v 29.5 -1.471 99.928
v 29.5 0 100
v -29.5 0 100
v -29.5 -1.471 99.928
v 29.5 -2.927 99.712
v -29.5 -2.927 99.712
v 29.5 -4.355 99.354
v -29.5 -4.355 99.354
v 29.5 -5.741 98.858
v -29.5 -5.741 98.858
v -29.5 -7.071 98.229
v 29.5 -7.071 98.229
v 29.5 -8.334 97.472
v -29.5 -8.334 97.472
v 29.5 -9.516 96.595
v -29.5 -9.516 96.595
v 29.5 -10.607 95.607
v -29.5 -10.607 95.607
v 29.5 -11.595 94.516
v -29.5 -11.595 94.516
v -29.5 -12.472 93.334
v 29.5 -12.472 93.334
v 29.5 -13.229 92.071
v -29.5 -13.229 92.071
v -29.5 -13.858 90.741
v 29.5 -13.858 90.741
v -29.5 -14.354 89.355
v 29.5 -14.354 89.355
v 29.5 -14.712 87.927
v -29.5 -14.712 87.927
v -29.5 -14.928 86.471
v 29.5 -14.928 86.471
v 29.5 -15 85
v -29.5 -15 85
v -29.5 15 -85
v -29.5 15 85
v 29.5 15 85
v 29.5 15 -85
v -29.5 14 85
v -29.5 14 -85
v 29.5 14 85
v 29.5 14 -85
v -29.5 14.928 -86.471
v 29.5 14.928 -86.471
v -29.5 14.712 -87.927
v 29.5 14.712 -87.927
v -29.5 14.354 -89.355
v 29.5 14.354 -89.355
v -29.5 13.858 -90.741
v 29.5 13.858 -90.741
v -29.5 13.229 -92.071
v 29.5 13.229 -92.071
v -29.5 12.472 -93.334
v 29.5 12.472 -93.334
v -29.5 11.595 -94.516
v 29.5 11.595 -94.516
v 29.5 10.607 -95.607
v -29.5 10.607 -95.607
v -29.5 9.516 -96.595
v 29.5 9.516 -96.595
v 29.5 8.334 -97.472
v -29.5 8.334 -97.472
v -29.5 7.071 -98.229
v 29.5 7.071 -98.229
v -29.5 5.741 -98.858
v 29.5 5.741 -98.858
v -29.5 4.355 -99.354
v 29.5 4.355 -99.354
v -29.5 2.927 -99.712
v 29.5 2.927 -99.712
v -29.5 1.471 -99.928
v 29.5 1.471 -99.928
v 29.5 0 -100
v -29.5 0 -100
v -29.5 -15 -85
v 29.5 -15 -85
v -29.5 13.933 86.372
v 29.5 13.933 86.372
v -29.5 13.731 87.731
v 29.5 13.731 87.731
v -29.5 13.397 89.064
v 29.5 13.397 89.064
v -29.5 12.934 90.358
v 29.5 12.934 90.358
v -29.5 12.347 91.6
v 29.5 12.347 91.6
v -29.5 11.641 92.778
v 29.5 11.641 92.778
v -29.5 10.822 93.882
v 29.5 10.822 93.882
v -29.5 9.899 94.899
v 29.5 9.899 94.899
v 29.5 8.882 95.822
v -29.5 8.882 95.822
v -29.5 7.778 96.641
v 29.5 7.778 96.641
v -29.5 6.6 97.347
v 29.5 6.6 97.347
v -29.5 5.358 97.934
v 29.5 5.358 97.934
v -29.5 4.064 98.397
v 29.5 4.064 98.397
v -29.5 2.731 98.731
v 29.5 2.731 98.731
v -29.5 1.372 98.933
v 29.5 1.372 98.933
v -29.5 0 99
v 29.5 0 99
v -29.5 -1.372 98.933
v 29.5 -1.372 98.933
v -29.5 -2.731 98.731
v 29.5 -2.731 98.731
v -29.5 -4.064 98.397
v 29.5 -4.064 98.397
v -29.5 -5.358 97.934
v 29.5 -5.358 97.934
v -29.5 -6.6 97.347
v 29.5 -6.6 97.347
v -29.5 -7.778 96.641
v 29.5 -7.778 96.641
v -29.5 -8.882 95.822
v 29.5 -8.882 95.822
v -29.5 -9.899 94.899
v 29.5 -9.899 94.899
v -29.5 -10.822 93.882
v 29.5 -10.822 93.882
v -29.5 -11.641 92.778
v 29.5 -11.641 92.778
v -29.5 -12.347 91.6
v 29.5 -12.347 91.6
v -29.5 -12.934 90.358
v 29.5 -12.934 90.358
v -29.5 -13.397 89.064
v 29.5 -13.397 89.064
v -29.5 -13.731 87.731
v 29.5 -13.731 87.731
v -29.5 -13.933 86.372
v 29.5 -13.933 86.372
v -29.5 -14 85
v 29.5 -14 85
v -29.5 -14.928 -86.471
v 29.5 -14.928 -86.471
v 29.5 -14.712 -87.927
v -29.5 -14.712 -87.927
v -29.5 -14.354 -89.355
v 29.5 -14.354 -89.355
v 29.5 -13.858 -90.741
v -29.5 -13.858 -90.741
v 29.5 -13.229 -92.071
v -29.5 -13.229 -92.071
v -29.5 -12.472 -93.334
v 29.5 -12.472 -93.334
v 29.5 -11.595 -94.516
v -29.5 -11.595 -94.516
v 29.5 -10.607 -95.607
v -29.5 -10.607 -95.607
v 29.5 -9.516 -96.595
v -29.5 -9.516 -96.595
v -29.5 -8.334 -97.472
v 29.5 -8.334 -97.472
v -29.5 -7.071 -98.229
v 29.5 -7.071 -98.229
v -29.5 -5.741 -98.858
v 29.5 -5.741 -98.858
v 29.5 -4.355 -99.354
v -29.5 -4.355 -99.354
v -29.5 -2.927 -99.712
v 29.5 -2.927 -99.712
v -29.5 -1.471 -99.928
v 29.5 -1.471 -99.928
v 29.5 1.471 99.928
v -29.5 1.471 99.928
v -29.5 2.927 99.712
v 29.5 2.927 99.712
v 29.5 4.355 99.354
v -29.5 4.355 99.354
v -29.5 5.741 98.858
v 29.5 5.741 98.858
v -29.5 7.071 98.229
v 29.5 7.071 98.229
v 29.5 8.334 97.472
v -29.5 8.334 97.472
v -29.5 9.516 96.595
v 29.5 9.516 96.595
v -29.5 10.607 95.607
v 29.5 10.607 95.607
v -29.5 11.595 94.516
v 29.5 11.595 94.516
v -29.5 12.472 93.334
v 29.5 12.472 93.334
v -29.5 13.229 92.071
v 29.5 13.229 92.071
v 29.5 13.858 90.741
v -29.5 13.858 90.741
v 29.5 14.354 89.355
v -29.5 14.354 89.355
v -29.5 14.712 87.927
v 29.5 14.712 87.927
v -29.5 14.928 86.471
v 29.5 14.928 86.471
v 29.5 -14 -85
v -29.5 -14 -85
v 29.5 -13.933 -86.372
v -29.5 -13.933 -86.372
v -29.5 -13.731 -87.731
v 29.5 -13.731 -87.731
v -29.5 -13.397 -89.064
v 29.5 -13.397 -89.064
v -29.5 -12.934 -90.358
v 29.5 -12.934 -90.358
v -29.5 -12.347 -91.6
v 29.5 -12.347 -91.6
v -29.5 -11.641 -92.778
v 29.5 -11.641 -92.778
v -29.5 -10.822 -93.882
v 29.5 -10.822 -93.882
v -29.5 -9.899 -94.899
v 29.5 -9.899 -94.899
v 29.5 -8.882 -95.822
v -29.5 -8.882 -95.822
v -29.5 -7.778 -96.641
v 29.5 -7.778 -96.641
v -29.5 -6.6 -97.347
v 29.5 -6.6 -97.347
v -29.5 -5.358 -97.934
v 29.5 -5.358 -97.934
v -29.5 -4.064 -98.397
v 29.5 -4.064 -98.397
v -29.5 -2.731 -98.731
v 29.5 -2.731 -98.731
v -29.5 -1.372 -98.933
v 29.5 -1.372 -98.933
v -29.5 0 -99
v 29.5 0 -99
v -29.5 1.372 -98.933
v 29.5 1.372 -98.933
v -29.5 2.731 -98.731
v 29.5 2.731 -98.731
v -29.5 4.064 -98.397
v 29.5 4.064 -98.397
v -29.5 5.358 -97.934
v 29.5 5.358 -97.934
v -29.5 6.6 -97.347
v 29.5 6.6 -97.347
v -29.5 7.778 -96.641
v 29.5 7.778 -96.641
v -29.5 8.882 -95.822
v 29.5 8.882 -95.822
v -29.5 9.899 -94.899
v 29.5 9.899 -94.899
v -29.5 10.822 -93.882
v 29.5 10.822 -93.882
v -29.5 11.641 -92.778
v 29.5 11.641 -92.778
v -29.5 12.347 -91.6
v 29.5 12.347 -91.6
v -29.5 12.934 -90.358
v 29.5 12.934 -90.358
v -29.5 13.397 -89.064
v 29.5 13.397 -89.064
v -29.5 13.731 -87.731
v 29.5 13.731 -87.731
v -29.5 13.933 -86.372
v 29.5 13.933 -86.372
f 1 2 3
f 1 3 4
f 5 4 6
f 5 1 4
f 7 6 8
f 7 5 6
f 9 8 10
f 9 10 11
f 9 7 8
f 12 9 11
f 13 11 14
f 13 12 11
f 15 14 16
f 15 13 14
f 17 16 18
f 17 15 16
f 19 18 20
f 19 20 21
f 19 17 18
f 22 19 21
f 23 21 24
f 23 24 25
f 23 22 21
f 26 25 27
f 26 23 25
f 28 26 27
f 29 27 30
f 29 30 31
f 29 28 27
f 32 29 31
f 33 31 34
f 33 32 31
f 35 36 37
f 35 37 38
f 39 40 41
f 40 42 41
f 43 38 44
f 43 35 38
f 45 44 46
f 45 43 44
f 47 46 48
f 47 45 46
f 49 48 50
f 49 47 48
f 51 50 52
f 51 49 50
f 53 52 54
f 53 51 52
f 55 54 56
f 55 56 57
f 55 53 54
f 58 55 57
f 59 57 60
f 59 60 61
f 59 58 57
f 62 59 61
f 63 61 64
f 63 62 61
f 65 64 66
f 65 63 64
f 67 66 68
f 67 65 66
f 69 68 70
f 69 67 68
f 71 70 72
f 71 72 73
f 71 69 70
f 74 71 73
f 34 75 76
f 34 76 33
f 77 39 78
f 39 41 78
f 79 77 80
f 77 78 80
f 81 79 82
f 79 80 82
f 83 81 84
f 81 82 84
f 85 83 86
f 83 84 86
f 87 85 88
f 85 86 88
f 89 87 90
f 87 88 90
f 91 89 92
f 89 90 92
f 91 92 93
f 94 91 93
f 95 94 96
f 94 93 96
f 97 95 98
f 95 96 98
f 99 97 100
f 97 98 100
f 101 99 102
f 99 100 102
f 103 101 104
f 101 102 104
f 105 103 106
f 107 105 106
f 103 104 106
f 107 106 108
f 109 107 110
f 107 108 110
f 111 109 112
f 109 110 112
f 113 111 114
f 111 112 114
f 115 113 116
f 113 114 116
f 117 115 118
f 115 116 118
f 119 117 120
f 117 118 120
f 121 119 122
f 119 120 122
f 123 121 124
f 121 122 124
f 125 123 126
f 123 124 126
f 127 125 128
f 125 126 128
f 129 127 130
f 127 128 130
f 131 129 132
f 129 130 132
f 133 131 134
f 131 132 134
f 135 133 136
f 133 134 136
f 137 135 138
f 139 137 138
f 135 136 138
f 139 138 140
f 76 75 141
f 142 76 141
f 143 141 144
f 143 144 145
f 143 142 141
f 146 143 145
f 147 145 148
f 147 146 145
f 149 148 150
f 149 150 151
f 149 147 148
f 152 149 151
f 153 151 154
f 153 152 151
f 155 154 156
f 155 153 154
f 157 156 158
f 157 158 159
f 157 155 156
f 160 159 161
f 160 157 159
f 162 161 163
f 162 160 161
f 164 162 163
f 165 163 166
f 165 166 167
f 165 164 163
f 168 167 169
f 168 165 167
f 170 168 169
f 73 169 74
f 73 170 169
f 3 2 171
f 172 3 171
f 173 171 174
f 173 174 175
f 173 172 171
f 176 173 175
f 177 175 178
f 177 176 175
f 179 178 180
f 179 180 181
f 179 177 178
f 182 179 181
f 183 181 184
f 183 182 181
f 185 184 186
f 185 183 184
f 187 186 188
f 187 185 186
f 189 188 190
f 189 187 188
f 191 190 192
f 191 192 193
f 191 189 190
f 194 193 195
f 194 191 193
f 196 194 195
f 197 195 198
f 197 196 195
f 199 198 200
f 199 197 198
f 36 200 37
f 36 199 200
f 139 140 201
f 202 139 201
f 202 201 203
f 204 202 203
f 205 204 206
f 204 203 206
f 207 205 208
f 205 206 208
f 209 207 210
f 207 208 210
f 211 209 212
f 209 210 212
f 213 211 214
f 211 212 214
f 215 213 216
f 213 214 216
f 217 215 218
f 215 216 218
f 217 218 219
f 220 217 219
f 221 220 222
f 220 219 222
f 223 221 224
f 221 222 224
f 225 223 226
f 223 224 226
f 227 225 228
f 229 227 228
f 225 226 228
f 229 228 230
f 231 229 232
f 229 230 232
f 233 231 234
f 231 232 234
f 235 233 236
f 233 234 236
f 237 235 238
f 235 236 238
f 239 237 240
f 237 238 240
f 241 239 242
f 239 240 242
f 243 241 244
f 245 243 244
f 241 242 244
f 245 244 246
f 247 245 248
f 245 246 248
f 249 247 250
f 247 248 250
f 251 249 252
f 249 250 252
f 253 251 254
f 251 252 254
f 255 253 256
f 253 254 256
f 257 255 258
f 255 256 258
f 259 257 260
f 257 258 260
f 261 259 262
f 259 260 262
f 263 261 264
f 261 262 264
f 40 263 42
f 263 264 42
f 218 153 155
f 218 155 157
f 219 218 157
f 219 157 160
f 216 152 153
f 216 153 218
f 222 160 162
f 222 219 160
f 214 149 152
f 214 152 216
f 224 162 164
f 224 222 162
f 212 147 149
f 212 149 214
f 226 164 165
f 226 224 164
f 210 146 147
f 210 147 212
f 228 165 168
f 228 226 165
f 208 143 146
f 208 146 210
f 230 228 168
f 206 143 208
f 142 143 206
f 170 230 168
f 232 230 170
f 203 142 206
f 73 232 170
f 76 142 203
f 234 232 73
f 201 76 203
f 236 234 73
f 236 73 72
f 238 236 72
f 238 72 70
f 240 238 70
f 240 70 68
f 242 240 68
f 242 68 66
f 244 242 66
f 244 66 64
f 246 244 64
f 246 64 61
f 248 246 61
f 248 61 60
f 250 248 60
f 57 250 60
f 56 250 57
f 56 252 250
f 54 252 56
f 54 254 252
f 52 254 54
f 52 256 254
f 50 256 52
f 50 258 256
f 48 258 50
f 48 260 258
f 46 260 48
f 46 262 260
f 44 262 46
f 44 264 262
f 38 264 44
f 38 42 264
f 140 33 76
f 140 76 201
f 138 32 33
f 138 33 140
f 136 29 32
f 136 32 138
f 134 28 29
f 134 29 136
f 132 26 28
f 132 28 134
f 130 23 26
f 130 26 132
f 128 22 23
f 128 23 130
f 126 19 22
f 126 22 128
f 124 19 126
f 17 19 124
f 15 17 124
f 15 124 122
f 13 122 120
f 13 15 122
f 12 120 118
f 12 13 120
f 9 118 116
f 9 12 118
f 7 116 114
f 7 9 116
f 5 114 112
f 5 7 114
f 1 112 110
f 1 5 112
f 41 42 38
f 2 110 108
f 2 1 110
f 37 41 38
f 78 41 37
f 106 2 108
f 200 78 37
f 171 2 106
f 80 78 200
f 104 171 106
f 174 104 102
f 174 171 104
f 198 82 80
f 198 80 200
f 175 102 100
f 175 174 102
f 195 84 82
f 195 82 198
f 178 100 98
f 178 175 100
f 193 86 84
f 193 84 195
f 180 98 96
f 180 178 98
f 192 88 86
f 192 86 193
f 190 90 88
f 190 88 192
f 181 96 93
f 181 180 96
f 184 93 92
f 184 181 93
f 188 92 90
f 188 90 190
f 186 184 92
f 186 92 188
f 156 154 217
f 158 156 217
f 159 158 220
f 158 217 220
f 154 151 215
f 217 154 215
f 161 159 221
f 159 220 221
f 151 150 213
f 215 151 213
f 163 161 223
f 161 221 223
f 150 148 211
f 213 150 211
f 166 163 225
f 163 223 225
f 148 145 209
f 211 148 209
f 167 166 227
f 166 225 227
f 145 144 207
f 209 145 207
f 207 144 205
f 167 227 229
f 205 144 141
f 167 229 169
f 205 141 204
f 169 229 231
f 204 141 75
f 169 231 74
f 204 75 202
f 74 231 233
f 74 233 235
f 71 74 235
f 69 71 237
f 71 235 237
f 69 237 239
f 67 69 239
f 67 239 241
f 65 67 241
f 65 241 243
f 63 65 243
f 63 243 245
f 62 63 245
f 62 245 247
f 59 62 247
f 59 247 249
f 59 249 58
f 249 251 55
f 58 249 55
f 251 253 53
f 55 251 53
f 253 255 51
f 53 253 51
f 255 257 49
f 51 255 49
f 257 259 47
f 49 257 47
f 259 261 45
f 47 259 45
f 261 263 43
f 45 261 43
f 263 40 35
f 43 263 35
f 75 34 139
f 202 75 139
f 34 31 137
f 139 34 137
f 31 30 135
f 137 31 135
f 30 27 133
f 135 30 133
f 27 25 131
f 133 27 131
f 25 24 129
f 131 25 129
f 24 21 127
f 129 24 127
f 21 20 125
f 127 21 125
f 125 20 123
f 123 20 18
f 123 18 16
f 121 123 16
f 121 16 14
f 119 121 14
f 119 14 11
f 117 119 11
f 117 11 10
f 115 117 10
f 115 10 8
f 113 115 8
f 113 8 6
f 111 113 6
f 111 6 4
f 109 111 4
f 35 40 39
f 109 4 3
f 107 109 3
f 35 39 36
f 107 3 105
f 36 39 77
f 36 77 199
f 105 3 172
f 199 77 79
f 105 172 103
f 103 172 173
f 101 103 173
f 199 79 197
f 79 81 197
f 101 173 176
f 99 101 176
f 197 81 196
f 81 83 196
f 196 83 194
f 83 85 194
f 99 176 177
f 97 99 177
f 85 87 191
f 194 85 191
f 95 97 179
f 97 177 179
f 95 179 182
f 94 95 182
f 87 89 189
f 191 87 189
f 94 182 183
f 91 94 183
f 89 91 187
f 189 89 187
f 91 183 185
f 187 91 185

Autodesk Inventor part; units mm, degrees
ref_plane "YZ Plane" through (0, 0, 0) normal (1, 0, 0) x (0, 1, 0)
ref_plane "XZ Plane" through (0, 0, 0) normal (0, 1, 0) x (-1, 0, 0)
ref_plane "XY Plane" through (0, 0, 0) normal (0, 0, 1) x (1, 0, 0)
sketch "Эскиз1" plane through (0, 0, 0) normal (1, 0, 0) x (0, 1, 0)
  line L0 (-15, 100) -> (15, 100)
  line L1 (15, 100) -> (15, -100)
  line L2 (15, -100) -> (-15, -100)
  line L3 (-15, -100) -> (-15, 100)
  line L4 (-21, 0) -> (21, 0) construction
  line L5 (0, -140) -> (0, 140) construction
  point P0 (0, 0)
  dimension "d0" = 200
  dimension "d1" = 30
extrude "Выдавливание2" add sketch "Эскиз1" along normal mid plane 59
fillet "Сопряжение1" radius 15 4 edges at (0, 15, 100) (0, -15, 100) (0, 15, -100) (0, -15, -100)
sketch "Эскиз2" plane through (29.5, 0, 0) normal (1, 0, 0) x (0, 0, -1)
  arc A0 (85, -15) -> (85, 15) centre (85, 0) ccw construction
  line L0 (85, 15) -> (-85, 15) construction
  arc A1 (-85, 15) -> (-85, -15) centre (-85, 0) ccw construction
  line L1 (-85, -15) -> (85, -15) construction
  line L2 (-99, -14) -> (99, -14)
  line L3 (99, -14) -> (99, 14)
  line L4 (99, 14) -> (-99, 14)
  line L5 (-99, 14) -> (-99, -14)
  arc A2 (-85, 14) -> (-99, 0) centre (-85, 0) ccw
  arc A3 (-85, 15) -> (-85, -15) centre (-85, 0) ccw projected
  arc A4 (-99, 0) -> (-85, -14) centre (-85, 0) ccw
  arc A5 (99, 0) -> (85, 14) centre (85, 0) ccw
  arc A6 (85, -15) -> (85, 15) centre (85, 0) ccw projected
  arc A7 (85, -14) -> (99, 0) centre (85, 0) ccw
  point P0 (0, 0)
  dimension "d11" = 198
  dimension "d12" = 28
  dimension "d13" = 1
  dimension "d14" = 1
extrude "Выдавливание3" cut sketch "Эскиз2" against normal blind 59 contours A4 A2 L4 A5 A7 L2
properties part number "Лента конвейера"
